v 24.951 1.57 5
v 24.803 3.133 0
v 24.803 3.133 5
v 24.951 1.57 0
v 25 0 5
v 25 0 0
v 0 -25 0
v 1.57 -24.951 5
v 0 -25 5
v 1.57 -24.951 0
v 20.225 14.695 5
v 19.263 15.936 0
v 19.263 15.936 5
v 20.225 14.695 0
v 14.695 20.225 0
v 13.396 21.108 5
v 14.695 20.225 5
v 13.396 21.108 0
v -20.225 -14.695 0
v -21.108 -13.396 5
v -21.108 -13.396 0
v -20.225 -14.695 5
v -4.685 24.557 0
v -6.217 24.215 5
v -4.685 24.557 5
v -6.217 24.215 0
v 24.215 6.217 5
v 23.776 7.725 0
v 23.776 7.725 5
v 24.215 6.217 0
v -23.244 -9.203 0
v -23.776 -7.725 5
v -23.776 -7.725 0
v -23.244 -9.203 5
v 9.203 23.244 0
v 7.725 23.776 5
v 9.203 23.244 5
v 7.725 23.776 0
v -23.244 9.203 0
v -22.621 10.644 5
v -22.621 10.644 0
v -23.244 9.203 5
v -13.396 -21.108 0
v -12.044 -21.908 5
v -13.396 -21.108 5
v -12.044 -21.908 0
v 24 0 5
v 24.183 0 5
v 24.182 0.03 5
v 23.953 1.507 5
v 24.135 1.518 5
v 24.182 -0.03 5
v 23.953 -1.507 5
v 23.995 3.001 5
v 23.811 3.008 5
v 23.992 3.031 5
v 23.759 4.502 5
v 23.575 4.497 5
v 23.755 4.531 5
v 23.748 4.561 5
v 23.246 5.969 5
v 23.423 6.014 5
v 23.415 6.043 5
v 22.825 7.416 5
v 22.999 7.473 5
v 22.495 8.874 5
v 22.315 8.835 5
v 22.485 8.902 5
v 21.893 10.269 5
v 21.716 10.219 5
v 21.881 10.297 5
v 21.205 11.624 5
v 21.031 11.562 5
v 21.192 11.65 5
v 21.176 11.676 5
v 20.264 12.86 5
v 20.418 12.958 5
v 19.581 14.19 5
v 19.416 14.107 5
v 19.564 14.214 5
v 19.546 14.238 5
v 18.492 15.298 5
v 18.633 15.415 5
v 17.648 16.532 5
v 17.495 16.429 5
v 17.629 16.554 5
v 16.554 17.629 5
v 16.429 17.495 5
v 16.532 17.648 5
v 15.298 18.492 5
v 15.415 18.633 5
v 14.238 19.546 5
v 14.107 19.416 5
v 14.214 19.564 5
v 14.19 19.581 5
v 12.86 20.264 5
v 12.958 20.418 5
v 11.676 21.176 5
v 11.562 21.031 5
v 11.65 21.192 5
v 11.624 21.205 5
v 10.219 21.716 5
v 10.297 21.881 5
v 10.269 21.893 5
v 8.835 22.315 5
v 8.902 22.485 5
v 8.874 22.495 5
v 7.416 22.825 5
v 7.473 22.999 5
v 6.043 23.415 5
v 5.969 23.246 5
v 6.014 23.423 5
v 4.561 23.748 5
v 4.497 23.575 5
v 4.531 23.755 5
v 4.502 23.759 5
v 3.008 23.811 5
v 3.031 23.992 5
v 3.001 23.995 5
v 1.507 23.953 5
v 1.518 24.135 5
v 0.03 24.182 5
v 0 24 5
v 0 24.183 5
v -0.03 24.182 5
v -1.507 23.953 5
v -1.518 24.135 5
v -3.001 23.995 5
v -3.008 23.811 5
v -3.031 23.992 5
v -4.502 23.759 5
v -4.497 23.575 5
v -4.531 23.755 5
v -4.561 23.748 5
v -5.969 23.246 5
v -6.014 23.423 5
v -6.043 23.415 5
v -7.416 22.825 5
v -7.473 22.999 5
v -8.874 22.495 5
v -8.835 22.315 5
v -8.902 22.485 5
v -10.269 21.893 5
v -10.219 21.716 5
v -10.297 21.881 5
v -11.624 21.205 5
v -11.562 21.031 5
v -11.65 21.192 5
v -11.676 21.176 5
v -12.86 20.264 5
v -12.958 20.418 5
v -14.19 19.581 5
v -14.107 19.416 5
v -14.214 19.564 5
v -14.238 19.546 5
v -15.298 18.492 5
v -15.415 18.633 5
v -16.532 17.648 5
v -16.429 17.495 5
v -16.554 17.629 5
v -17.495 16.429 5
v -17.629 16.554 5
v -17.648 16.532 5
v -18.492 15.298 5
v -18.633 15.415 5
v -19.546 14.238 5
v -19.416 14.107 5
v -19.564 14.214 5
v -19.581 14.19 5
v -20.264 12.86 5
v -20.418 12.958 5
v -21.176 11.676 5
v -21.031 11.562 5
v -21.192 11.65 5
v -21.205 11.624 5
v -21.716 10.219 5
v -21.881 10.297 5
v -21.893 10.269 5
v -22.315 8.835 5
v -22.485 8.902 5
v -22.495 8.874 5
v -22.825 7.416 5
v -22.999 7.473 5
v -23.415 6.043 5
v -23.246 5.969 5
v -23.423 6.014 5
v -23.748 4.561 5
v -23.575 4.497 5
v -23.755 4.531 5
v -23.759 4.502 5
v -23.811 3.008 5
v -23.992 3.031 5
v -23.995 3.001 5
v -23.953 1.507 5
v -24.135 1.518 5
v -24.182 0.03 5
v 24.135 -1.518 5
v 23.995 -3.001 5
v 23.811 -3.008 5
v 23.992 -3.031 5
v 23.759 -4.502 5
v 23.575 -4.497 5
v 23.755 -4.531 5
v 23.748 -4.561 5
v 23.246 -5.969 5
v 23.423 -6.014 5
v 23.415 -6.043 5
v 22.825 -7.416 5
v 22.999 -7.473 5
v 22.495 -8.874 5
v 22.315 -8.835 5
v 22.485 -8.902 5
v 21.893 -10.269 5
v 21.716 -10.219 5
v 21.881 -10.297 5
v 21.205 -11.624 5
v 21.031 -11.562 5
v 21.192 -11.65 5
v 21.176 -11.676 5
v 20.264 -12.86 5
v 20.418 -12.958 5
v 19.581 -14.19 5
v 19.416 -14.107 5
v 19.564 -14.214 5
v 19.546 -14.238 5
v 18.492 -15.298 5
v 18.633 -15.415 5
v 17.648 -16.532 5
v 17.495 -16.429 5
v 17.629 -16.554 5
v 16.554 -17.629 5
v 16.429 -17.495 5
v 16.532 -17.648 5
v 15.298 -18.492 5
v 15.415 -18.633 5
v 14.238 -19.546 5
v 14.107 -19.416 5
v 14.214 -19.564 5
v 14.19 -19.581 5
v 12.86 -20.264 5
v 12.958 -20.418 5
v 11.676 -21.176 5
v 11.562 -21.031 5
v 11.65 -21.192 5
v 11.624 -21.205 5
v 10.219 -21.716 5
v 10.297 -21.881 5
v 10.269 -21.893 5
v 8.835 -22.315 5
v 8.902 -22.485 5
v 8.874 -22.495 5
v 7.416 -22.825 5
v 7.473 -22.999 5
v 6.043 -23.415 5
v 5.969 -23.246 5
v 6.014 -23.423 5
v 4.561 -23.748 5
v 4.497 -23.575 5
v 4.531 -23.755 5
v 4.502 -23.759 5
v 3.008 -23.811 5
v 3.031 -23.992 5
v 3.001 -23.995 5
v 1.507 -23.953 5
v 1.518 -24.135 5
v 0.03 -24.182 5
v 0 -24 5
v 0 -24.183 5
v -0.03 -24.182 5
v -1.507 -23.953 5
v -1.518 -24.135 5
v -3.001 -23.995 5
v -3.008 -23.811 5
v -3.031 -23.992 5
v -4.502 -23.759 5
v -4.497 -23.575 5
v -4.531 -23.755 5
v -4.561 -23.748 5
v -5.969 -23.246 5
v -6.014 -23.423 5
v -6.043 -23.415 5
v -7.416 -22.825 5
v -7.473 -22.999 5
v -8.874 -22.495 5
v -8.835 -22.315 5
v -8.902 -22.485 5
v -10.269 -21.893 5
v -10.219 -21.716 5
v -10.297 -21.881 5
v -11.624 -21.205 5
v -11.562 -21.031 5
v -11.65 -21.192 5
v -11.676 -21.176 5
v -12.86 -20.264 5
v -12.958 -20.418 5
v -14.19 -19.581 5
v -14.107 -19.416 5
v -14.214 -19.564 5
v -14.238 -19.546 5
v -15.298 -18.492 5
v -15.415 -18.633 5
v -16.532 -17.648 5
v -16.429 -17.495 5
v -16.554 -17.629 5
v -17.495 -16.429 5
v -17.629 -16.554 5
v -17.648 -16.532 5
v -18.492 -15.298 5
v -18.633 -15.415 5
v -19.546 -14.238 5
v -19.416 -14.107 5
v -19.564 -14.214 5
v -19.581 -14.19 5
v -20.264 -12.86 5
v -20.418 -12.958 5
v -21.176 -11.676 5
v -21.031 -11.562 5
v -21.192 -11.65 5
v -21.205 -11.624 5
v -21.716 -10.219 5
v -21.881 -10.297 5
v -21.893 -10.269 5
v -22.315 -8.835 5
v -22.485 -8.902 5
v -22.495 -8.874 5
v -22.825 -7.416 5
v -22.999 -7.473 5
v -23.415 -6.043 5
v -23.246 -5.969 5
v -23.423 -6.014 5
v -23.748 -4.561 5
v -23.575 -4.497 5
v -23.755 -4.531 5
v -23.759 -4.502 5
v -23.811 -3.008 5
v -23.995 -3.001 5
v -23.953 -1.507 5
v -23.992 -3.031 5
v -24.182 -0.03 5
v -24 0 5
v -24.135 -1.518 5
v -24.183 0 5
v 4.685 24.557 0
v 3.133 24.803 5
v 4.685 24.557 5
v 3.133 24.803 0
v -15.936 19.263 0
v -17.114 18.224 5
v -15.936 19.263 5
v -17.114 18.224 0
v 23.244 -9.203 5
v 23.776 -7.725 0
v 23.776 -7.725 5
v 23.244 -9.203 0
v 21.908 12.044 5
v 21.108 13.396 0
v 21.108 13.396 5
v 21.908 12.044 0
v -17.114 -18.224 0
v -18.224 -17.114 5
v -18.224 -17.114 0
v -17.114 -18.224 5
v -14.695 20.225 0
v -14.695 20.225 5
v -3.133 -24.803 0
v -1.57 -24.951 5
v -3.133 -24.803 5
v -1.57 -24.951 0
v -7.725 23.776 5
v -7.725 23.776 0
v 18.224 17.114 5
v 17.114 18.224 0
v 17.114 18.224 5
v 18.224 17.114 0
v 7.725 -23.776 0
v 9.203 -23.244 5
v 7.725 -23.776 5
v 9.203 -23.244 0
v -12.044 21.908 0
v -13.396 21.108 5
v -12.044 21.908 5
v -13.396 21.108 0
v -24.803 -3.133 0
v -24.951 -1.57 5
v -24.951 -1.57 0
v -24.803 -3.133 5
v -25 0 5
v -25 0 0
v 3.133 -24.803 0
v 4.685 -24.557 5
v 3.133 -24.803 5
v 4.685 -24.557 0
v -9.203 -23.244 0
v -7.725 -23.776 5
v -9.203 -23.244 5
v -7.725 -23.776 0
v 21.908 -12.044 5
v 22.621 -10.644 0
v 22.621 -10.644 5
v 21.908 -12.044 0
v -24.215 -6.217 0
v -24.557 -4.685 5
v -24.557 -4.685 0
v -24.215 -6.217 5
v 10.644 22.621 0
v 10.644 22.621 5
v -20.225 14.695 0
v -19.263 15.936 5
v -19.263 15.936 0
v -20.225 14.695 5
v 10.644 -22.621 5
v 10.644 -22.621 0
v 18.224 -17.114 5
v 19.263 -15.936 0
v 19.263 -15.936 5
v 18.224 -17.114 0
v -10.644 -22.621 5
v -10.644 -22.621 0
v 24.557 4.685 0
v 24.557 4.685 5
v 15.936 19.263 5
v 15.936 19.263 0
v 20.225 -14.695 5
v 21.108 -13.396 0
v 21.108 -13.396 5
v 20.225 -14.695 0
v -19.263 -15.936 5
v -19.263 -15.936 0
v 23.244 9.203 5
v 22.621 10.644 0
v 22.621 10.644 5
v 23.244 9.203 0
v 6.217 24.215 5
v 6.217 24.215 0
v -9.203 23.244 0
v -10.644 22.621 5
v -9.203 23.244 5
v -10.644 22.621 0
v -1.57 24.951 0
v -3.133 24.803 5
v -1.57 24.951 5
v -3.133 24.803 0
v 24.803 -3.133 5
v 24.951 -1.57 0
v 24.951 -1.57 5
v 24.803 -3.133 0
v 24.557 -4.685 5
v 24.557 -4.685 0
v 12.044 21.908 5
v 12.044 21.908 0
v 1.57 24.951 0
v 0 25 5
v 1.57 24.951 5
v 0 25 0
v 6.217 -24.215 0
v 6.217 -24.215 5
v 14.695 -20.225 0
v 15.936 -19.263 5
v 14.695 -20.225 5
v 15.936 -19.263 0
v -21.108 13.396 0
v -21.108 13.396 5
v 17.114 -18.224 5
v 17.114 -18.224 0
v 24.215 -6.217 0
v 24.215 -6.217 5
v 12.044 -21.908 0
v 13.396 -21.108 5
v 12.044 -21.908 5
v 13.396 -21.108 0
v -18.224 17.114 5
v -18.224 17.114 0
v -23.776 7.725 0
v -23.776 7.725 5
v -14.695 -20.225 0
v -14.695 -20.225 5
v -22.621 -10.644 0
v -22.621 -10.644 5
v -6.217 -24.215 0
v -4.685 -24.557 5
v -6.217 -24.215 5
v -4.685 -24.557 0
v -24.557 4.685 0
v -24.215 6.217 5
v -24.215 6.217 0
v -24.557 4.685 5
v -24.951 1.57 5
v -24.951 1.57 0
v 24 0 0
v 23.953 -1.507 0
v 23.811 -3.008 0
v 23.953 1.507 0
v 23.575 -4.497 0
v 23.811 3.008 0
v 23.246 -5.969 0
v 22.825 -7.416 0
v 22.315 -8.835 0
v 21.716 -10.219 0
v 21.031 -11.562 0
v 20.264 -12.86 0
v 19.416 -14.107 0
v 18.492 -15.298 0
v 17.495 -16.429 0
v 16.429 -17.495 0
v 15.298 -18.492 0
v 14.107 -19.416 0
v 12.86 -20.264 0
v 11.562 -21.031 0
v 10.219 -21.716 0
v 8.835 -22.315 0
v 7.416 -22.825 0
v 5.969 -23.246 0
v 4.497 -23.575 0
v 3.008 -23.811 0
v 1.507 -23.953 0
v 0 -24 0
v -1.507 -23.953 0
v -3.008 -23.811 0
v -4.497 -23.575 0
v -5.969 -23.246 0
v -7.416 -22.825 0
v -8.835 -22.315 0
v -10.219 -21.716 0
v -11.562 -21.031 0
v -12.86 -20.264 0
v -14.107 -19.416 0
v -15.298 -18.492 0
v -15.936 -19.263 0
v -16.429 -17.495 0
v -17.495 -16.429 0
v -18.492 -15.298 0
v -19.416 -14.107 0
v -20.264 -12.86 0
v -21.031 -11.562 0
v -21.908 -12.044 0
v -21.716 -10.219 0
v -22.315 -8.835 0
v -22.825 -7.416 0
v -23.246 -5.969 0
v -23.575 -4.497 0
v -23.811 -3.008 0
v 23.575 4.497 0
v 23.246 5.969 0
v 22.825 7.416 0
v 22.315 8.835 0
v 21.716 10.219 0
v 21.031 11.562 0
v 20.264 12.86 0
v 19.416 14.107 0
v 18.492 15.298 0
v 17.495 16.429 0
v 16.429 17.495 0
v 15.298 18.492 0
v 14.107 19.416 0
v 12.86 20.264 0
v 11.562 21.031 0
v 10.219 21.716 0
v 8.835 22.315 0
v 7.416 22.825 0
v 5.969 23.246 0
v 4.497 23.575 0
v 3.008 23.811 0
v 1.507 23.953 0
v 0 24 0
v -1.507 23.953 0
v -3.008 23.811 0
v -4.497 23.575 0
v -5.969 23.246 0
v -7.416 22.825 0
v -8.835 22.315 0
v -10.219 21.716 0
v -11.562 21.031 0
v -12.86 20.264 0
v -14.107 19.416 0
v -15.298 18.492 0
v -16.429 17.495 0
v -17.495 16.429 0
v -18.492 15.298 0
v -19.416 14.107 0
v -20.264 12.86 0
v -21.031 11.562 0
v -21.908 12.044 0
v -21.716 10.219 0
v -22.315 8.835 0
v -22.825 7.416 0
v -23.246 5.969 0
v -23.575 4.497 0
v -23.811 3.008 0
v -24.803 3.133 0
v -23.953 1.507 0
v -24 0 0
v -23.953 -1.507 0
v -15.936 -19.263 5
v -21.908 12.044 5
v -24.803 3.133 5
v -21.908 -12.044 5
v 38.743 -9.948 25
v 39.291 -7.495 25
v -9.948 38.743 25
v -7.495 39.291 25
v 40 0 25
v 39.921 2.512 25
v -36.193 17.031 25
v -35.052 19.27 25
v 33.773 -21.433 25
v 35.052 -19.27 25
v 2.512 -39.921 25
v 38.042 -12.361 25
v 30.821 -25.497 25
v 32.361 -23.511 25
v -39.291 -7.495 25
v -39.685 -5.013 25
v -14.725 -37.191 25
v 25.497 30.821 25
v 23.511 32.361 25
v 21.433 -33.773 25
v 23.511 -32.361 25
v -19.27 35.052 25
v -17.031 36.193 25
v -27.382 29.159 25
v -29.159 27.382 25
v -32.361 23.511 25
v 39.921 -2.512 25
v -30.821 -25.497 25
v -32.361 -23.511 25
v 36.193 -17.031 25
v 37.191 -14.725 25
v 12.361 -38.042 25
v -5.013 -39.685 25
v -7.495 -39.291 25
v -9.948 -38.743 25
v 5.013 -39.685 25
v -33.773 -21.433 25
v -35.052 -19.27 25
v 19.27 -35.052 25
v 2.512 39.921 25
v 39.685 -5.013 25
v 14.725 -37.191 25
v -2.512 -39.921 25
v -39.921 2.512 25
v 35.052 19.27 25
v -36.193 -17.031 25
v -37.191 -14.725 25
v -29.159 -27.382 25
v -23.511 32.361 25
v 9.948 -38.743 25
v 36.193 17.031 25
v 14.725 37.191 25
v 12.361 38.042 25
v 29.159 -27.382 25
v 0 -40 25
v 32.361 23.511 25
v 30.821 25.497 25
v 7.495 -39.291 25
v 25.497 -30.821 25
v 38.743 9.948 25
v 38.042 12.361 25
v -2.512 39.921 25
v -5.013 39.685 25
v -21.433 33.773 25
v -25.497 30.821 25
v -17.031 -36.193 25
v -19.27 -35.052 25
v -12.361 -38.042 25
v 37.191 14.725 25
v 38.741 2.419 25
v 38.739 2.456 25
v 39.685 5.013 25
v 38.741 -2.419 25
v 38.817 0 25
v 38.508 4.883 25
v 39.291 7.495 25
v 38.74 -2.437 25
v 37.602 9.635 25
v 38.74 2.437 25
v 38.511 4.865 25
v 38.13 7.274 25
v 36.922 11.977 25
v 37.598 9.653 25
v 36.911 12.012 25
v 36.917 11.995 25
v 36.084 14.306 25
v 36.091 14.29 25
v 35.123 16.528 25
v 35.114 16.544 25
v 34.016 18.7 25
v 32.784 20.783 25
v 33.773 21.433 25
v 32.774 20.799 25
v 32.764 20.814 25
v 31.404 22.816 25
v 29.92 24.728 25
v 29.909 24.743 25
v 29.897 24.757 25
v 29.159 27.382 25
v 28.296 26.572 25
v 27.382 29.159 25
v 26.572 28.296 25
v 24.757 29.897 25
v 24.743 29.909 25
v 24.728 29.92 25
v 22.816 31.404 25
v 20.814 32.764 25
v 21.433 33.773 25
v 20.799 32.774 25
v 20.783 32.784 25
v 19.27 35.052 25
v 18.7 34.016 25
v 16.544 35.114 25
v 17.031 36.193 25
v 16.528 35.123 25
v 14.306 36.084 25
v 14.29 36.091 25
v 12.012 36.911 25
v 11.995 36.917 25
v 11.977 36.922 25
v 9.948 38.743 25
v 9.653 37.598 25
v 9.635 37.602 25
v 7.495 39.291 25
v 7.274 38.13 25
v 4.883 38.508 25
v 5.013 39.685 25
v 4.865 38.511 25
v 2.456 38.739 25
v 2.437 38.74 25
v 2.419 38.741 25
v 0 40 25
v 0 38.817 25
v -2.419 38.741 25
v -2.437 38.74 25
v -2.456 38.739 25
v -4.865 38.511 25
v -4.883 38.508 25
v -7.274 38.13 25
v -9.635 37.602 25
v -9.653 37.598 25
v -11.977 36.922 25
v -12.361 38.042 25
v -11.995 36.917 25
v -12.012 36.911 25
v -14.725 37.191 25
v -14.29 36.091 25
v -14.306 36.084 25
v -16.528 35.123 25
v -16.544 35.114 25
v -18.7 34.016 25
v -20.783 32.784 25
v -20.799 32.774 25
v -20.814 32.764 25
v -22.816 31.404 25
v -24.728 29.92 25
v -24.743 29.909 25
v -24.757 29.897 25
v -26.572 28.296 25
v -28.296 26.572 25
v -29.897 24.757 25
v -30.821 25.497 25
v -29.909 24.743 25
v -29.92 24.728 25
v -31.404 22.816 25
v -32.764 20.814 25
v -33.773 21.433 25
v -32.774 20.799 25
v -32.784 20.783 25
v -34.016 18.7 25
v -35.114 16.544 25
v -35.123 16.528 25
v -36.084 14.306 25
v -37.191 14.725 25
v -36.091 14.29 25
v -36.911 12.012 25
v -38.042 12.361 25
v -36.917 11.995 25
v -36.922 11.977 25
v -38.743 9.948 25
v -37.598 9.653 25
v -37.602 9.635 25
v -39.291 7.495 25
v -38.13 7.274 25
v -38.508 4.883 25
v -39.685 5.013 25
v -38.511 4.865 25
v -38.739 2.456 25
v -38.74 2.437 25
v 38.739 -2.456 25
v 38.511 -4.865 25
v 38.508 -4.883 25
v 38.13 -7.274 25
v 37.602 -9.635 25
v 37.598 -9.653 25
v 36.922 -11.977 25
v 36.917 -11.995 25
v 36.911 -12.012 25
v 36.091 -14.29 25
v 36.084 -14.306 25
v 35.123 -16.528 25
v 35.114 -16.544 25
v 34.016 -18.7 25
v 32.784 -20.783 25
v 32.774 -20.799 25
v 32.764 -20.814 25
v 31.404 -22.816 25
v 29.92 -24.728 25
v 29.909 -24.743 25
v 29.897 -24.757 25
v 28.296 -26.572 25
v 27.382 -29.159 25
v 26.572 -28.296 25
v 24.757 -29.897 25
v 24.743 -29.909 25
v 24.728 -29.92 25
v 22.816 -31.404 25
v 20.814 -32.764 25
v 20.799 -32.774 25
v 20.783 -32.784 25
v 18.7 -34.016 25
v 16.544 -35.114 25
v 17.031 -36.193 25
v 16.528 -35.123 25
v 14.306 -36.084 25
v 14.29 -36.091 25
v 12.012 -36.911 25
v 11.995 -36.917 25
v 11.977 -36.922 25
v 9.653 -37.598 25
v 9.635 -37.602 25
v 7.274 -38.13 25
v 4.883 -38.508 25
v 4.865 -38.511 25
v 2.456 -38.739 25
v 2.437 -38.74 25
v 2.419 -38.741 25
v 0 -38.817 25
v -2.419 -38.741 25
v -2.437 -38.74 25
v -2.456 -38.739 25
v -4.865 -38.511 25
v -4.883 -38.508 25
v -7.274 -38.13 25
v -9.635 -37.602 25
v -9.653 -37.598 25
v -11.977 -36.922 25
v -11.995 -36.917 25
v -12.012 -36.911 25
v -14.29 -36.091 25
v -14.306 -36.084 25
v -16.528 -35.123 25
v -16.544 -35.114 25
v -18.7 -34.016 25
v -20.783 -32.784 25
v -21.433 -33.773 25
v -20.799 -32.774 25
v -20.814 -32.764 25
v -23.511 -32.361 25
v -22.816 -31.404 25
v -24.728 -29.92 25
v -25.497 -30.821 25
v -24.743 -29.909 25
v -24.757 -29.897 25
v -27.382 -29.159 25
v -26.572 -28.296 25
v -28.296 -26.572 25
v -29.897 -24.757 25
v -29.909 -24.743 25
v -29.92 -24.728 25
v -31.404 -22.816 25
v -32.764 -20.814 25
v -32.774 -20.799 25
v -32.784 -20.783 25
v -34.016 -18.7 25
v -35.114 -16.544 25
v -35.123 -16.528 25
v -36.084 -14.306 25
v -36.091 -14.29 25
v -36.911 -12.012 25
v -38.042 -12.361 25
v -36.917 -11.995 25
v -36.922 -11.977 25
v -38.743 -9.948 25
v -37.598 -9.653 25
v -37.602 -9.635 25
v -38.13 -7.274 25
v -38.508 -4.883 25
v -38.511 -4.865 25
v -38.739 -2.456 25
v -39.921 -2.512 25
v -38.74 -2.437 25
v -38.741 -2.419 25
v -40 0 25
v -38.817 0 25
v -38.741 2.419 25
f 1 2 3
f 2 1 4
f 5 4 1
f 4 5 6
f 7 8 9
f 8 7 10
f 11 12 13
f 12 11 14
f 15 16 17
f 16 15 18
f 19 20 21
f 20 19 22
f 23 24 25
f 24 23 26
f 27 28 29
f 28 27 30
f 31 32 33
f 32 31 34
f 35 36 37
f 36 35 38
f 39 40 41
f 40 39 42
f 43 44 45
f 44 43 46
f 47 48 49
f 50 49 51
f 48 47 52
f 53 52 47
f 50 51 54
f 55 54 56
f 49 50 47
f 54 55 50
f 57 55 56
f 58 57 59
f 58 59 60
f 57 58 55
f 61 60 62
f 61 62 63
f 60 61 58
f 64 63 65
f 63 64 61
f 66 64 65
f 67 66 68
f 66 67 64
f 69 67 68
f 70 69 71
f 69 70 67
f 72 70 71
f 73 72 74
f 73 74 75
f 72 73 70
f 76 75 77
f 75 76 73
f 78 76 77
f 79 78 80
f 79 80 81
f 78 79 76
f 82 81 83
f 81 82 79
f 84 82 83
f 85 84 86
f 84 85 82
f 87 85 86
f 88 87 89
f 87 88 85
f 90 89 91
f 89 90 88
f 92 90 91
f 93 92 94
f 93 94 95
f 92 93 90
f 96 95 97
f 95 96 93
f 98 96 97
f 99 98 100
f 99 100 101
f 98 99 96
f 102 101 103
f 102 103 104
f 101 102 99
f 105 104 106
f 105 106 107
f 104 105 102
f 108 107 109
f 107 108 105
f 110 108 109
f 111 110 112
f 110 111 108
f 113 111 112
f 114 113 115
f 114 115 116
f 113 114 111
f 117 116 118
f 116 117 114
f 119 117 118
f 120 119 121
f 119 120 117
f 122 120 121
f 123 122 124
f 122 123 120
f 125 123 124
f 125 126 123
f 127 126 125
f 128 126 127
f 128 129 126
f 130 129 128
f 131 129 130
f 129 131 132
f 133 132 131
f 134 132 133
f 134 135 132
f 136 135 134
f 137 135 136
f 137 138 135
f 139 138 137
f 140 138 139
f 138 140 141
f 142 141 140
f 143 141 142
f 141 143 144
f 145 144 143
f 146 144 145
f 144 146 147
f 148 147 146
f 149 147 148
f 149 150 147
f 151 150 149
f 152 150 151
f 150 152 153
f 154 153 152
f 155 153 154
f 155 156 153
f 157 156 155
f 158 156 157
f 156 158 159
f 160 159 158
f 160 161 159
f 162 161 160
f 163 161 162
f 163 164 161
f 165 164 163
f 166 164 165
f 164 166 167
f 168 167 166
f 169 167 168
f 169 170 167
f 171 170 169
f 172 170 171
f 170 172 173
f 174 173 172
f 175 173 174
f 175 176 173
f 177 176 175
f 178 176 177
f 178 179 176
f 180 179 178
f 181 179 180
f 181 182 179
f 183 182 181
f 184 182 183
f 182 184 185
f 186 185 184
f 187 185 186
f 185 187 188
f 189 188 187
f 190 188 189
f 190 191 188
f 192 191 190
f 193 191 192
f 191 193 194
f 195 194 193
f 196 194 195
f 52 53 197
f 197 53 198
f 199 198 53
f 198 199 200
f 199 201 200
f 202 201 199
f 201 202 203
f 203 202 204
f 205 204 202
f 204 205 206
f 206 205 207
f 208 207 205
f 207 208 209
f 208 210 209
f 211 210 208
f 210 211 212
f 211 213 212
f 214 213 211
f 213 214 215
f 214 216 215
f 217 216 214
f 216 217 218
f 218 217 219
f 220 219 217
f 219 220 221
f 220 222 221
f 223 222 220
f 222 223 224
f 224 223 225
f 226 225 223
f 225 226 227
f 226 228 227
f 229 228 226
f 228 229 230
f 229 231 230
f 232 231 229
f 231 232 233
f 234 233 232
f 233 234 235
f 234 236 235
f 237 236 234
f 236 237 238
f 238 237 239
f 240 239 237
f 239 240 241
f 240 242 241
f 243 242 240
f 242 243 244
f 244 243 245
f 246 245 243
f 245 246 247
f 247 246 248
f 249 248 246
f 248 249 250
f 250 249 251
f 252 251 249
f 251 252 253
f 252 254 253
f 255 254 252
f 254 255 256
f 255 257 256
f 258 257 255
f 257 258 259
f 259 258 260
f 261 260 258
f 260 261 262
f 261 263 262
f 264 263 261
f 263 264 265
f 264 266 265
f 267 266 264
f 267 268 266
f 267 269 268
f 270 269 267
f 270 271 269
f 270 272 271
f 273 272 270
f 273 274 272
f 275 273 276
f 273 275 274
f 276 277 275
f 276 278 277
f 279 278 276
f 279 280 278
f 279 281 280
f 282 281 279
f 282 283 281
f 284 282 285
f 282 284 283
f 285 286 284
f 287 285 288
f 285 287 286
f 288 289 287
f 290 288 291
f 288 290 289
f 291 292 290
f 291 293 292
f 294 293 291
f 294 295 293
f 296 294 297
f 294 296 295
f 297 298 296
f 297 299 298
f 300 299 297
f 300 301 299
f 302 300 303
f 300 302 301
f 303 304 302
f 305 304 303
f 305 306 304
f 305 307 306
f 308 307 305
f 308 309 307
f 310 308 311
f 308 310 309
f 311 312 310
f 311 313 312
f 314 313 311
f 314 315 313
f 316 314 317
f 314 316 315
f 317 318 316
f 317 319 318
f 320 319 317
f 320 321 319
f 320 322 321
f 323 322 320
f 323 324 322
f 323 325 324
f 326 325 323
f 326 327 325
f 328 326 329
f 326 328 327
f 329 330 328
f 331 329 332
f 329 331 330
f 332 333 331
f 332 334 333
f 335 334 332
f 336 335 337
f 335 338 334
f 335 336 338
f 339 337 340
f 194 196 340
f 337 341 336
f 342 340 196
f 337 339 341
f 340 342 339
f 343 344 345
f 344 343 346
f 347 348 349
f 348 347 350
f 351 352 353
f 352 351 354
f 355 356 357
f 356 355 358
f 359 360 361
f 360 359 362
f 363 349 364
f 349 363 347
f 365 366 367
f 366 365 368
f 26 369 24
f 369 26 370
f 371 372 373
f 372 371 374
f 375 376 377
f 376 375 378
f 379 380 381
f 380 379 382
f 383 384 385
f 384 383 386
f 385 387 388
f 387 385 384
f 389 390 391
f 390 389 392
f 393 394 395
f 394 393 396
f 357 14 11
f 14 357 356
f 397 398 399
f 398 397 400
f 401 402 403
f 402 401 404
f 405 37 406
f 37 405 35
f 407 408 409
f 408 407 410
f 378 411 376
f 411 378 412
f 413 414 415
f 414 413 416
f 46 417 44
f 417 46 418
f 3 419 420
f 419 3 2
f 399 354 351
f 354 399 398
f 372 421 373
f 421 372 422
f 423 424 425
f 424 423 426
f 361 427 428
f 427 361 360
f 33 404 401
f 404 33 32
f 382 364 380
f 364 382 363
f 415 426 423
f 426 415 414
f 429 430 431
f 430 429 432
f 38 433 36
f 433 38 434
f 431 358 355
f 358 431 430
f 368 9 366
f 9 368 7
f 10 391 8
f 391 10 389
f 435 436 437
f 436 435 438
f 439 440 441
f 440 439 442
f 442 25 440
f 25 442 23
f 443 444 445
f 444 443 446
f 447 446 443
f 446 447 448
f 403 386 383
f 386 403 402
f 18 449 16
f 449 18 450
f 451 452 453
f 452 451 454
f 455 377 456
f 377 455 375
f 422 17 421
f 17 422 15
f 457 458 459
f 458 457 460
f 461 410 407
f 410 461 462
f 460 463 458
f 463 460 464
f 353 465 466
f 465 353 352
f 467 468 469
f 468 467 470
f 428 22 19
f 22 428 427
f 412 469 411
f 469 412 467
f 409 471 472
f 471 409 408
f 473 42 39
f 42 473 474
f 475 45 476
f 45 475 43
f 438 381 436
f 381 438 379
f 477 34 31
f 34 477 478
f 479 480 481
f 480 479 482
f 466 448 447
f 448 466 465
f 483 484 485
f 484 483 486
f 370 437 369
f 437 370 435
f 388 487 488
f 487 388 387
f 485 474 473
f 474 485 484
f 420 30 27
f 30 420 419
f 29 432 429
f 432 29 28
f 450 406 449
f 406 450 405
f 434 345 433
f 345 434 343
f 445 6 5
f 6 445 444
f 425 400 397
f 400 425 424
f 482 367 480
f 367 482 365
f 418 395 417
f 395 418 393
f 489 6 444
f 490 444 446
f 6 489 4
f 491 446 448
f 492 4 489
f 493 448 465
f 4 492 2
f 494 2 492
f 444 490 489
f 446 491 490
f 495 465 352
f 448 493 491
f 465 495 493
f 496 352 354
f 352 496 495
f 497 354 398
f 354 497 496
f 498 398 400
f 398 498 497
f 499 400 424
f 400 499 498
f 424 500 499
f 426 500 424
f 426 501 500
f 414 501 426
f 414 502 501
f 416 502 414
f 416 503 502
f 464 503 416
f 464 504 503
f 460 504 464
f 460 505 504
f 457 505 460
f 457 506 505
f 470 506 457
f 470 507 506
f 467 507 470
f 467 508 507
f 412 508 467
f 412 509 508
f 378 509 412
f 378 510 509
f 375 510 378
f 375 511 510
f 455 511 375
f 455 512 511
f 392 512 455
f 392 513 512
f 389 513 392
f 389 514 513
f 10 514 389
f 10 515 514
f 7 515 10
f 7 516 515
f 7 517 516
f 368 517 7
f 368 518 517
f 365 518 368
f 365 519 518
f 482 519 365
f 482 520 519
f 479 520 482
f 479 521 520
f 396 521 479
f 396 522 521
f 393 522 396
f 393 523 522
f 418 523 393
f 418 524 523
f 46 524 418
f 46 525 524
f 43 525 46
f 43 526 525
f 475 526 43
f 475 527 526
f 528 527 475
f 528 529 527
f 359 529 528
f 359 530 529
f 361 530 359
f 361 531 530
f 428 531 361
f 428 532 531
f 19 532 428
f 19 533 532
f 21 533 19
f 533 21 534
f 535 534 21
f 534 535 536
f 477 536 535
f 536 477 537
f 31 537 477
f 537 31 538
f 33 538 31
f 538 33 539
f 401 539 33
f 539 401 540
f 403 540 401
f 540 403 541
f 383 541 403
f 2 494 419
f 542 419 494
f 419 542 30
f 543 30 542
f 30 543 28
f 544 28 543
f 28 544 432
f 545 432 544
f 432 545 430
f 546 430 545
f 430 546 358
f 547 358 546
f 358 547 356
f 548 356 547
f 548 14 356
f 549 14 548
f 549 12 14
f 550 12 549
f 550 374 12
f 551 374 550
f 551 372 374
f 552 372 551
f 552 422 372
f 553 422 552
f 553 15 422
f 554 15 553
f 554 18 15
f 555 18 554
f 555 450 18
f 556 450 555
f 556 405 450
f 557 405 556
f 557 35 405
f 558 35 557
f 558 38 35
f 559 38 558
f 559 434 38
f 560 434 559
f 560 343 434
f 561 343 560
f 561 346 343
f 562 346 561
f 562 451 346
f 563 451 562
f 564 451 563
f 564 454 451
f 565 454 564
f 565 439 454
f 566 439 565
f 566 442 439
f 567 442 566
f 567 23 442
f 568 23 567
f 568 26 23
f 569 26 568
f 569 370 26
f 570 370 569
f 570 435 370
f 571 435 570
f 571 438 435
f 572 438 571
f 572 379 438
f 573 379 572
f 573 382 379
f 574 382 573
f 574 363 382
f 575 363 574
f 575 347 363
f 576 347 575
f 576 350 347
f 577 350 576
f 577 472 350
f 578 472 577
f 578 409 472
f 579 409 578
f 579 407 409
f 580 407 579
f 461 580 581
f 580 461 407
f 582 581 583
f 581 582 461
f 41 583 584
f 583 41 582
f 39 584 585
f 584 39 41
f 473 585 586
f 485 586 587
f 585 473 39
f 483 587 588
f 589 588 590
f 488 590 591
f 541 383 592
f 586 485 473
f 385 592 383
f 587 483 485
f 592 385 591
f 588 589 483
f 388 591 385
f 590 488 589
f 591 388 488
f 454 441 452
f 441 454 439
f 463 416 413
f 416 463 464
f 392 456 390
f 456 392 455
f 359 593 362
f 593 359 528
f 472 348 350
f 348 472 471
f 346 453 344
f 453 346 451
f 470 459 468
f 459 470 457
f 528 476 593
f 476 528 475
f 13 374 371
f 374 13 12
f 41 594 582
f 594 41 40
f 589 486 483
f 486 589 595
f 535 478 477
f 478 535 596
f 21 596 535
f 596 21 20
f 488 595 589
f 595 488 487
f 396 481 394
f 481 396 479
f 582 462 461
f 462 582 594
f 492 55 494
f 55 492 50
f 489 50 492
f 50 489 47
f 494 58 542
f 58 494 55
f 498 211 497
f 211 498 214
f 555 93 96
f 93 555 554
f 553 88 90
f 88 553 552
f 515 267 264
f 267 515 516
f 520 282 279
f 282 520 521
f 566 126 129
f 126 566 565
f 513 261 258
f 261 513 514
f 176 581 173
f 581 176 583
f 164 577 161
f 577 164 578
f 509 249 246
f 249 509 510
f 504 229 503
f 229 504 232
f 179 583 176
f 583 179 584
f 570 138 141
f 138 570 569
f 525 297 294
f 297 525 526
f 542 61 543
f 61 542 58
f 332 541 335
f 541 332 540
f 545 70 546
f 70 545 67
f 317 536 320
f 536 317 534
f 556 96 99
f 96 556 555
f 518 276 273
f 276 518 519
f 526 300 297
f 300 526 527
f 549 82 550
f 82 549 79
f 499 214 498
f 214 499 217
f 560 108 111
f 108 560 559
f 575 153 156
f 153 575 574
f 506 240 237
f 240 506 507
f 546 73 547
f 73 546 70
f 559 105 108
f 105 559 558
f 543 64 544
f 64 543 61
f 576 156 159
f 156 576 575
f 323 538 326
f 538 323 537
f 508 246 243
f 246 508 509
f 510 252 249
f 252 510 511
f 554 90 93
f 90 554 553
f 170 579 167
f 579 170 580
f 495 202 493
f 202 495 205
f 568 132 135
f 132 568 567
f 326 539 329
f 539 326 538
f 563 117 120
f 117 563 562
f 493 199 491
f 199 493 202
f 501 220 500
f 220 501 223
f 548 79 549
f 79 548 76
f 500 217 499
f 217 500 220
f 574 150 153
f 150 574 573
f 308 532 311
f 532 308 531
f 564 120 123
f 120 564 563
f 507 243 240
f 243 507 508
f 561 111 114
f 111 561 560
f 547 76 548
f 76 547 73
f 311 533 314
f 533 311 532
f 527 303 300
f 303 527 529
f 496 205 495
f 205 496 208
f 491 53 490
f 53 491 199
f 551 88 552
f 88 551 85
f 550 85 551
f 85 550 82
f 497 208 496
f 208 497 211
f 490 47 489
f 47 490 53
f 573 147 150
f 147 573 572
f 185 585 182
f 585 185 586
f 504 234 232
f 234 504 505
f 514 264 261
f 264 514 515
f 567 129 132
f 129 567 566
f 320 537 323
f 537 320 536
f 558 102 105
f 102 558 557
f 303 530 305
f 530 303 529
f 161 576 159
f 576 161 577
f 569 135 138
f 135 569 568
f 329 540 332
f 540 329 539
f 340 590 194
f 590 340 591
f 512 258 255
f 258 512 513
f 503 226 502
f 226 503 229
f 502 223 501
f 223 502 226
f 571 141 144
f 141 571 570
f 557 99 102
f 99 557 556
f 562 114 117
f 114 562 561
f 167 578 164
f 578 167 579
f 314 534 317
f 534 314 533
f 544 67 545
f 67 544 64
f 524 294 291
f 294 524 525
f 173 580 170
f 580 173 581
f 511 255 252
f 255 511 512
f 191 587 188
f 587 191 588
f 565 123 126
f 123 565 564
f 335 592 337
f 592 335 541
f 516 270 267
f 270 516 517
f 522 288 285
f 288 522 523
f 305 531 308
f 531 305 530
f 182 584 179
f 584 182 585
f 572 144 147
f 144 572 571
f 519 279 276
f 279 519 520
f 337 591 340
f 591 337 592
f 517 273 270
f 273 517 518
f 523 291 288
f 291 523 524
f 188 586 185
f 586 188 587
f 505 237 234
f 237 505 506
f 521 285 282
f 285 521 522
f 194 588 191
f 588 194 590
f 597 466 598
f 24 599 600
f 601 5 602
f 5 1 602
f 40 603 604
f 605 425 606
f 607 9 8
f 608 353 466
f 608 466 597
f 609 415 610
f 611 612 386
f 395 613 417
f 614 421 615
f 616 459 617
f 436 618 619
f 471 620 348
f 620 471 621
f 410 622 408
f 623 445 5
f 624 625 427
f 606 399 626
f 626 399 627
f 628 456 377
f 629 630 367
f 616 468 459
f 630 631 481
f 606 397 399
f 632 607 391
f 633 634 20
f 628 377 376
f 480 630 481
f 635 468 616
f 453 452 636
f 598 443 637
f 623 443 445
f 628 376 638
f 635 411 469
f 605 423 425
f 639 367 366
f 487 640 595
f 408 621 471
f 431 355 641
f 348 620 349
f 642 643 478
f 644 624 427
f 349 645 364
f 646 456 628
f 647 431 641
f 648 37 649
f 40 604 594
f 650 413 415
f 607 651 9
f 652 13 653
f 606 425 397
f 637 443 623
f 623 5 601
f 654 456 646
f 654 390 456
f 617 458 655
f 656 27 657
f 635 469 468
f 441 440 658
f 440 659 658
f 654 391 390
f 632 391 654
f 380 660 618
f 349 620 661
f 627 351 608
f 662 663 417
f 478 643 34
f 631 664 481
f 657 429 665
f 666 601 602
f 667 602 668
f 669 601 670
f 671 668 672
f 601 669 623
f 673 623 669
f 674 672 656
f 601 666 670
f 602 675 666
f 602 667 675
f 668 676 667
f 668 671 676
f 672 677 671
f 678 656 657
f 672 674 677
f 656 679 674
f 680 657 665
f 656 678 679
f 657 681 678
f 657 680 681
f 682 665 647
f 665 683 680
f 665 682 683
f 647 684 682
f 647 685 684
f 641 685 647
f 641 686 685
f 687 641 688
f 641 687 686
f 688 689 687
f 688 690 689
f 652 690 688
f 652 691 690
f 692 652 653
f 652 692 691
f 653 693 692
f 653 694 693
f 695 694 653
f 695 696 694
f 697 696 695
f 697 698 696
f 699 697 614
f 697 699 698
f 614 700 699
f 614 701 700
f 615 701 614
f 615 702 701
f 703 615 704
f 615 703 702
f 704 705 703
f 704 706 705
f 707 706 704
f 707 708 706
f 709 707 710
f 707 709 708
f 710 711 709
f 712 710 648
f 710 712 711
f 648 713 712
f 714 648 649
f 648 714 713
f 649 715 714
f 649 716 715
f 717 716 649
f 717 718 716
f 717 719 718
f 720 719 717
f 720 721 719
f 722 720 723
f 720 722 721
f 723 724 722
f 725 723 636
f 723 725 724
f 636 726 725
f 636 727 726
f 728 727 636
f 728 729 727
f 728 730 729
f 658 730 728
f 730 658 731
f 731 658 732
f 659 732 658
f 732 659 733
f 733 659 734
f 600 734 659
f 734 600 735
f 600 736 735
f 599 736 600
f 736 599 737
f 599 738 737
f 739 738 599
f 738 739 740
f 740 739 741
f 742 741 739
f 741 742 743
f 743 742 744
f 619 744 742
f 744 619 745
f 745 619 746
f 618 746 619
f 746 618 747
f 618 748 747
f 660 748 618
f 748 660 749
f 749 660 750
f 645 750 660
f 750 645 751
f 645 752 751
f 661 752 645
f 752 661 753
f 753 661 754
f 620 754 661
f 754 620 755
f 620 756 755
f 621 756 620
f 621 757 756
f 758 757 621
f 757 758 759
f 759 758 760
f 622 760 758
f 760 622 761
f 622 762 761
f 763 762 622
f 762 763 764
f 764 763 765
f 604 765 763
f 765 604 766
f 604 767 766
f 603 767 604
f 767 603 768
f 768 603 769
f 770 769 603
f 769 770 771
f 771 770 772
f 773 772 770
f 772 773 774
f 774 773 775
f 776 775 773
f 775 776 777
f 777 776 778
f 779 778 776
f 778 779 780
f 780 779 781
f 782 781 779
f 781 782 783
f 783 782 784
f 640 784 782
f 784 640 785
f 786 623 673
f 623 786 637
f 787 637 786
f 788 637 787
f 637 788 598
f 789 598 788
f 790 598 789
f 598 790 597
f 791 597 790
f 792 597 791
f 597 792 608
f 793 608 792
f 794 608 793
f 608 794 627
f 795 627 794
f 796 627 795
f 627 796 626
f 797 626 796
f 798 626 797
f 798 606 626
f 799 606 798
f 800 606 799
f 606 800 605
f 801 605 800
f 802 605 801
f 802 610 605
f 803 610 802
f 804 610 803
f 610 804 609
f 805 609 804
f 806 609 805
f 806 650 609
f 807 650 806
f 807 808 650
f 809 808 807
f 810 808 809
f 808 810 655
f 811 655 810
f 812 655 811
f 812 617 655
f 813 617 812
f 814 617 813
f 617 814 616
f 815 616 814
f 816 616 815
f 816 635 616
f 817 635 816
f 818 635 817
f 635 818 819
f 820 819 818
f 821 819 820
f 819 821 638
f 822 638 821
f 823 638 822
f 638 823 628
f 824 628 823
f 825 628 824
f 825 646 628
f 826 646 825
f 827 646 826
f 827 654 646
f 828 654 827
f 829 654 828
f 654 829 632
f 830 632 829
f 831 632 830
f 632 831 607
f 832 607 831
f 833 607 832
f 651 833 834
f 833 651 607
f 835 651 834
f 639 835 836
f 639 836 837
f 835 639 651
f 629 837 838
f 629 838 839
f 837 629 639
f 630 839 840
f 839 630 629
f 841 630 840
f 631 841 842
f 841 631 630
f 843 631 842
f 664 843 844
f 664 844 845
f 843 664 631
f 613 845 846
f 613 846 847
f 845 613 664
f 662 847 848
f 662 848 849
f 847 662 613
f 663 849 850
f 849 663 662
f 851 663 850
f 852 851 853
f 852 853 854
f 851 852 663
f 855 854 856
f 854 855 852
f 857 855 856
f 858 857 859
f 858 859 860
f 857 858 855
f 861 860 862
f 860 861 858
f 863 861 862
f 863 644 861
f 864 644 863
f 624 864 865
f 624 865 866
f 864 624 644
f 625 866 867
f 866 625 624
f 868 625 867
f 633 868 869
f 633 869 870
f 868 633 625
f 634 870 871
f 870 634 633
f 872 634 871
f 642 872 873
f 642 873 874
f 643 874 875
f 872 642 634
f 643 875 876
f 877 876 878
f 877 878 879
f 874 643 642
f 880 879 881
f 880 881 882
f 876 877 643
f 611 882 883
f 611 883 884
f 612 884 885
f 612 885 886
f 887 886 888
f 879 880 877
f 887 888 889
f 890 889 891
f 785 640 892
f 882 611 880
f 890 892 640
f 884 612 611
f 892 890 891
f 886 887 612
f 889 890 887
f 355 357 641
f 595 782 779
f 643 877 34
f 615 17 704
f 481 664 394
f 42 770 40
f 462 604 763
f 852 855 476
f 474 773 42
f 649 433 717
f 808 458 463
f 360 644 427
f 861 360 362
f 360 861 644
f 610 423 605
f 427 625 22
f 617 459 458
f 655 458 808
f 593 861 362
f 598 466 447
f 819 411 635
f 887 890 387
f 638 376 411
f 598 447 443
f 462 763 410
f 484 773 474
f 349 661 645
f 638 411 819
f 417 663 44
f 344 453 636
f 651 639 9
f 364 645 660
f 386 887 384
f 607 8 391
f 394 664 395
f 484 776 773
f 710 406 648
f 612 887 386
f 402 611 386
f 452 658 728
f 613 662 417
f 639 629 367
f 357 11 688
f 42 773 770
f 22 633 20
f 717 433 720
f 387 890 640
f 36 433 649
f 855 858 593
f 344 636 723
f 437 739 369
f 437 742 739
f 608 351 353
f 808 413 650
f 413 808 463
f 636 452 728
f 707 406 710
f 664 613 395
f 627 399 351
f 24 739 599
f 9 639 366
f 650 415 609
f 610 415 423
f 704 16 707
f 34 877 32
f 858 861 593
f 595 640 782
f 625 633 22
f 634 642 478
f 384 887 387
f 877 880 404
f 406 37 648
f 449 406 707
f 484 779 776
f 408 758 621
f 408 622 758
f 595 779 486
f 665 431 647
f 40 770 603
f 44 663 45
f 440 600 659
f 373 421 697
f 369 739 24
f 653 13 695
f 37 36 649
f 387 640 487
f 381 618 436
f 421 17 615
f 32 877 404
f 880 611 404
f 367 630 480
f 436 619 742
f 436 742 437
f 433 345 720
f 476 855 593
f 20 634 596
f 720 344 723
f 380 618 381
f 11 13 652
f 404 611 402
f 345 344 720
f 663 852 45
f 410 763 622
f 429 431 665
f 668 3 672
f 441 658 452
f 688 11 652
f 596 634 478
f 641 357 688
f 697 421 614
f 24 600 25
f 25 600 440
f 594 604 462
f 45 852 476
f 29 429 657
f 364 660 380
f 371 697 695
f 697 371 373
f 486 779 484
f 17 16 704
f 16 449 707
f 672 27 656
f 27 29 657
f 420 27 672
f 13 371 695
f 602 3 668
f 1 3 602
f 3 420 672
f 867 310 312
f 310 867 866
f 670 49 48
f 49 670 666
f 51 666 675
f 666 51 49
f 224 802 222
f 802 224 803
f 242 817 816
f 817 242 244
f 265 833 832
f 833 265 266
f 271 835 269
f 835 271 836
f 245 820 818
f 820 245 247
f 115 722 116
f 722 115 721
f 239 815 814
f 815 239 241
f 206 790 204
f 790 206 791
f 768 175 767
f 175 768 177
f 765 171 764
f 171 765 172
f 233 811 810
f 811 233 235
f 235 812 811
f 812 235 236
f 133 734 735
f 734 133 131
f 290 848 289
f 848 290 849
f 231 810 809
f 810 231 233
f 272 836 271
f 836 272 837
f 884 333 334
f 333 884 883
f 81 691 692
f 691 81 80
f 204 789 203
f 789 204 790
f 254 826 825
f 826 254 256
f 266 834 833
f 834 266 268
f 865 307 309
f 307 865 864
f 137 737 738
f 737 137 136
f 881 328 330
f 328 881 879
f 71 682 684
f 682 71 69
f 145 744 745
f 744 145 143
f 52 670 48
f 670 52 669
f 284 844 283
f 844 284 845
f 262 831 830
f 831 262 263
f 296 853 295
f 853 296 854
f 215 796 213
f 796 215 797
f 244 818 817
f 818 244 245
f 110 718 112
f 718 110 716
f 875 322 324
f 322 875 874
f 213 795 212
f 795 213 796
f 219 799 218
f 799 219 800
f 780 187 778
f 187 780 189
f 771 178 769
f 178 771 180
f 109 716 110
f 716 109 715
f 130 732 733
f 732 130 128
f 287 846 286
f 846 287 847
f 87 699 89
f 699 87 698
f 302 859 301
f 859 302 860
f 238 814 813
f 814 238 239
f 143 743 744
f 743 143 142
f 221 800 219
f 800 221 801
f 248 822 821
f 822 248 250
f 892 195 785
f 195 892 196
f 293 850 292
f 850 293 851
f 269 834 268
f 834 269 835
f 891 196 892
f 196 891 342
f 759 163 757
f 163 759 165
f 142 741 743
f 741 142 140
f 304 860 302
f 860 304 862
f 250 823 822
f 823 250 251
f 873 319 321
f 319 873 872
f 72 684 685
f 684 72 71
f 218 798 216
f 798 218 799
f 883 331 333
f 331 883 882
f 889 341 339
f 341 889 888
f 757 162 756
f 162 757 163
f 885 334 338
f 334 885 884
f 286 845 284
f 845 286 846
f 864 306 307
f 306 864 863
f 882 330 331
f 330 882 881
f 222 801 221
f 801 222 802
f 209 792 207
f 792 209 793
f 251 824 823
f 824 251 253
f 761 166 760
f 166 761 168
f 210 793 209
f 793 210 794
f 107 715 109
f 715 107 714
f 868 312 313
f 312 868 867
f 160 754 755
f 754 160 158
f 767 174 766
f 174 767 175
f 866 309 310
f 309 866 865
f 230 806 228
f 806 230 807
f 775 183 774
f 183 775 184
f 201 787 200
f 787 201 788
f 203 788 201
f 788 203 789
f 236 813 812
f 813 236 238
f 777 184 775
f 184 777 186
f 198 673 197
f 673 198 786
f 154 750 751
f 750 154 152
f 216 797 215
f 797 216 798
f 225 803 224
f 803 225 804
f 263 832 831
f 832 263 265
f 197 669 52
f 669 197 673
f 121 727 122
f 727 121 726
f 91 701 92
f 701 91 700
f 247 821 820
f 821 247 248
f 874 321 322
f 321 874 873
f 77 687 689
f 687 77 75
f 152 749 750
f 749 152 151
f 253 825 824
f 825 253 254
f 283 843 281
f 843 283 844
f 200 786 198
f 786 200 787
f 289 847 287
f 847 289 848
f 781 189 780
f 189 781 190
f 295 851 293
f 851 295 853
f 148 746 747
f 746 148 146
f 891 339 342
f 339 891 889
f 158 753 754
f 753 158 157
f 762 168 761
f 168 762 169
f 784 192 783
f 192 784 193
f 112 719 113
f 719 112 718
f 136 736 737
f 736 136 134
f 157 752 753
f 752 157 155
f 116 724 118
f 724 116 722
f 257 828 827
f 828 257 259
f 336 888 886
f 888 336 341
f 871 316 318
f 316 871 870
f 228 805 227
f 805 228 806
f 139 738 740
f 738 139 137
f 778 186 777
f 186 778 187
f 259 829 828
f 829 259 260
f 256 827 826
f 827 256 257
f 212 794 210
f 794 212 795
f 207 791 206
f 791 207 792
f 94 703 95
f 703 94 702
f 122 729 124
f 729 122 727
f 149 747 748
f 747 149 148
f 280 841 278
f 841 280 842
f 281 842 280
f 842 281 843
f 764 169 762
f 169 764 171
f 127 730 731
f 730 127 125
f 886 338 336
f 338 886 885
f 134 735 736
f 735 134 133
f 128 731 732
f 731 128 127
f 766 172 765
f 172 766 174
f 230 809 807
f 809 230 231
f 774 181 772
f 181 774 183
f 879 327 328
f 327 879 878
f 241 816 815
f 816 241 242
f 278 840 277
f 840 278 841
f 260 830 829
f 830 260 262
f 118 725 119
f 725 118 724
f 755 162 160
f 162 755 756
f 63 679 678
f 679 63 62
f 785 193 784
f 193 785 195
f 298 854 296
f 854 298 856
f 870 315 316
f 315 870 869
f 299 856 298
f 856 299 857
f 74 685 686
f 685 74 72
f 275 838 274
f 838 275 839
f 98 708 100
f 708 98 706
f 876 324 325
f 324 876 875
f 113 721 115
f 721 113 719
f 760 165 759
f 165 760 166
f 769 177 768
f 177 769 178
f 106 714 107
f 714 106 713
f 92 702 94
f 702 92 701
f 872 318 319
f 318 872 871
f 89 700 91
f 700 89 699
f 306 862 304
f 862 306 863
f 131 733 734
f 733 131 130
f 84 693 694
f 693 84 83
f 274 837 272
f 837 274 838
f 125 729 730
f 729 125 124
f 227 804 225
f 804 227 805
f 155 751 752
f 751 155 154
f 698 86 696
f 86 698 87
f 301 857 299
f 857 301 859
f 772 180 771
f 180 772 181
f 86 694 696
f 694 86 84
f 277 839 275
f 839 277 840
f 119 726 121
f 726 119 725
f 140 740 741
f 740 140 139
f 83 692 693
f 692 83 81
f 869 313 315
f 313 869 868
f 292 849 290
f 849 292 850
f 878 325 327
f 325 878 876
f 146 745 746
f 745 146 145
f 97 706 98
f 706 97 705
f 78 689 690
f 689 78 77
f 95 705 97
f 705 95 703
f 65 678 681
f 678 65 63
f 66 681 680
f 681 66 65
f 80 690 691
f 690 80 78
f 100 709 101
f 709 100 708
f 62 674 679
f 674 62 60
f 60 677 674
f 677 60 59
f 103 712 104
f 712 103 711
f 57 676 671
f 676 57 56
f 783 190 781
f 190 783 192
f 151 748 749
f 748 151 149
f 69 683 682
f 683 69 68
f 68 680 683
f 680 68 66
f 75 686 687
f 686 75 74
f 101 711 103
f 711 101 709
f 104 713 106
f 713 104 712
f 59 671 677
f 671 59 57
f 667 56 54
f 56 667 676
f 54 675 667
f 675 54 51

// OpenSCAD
/**
* Simple parametrical funnel
* @author itzco
* @version 1.0.2
*/

/* [Main] */

// Height of bottom pipe
baseHeight=5;          // [2:1:100] 
// Bottom pipe diameter
baseDiam = 50;         // [5:200] 
// Height of top cone
funnelHeight = 20;     // [10:100] 
// Top opening
funnelTopDiam = 80;    // [10:100] 
// Wall thickness
tk = 1;                // [0.3:0.1:10]  


/* [Internal] */
// Non zero wall adjustments should need any change
nz = 0.5;
nzm= 0.25;
// Quality 10-100
$fn=100;                // [10:100]

//funnel();
funnel (baseHeight, baseDiam, funnelHeight, funnelTopDiam, tk);

module funnel(
    baseHeight=30, 
    baseDiam=10, 
    funnelHeight=50,
    funnelTopDiam=80,
    tk=1) {
    union(){
        pipe(baseHeight, baseDiam,tk);
        translate([0,0,baseHeight])
        cone(funnelHeight, baseDiam, funnelTopDiam,tk);
    }
}
module pipe(h,d,tk=1) {
    difference(){
        cylinder(h=h,d=d);
        translate([0,0,-nzm])
        cylinder(h=h+nz,d=d-tk*2);
    }
}
module cone(h,d1,d2,tk=1) {
    difference(){
        cylinder(h=h,d1=d1,d2=d2);
        translate([0,0,-nzm])
        cylinder(h=h+nz,d1=d1-tk*2, d2=d2-tk*2);
    }
}
